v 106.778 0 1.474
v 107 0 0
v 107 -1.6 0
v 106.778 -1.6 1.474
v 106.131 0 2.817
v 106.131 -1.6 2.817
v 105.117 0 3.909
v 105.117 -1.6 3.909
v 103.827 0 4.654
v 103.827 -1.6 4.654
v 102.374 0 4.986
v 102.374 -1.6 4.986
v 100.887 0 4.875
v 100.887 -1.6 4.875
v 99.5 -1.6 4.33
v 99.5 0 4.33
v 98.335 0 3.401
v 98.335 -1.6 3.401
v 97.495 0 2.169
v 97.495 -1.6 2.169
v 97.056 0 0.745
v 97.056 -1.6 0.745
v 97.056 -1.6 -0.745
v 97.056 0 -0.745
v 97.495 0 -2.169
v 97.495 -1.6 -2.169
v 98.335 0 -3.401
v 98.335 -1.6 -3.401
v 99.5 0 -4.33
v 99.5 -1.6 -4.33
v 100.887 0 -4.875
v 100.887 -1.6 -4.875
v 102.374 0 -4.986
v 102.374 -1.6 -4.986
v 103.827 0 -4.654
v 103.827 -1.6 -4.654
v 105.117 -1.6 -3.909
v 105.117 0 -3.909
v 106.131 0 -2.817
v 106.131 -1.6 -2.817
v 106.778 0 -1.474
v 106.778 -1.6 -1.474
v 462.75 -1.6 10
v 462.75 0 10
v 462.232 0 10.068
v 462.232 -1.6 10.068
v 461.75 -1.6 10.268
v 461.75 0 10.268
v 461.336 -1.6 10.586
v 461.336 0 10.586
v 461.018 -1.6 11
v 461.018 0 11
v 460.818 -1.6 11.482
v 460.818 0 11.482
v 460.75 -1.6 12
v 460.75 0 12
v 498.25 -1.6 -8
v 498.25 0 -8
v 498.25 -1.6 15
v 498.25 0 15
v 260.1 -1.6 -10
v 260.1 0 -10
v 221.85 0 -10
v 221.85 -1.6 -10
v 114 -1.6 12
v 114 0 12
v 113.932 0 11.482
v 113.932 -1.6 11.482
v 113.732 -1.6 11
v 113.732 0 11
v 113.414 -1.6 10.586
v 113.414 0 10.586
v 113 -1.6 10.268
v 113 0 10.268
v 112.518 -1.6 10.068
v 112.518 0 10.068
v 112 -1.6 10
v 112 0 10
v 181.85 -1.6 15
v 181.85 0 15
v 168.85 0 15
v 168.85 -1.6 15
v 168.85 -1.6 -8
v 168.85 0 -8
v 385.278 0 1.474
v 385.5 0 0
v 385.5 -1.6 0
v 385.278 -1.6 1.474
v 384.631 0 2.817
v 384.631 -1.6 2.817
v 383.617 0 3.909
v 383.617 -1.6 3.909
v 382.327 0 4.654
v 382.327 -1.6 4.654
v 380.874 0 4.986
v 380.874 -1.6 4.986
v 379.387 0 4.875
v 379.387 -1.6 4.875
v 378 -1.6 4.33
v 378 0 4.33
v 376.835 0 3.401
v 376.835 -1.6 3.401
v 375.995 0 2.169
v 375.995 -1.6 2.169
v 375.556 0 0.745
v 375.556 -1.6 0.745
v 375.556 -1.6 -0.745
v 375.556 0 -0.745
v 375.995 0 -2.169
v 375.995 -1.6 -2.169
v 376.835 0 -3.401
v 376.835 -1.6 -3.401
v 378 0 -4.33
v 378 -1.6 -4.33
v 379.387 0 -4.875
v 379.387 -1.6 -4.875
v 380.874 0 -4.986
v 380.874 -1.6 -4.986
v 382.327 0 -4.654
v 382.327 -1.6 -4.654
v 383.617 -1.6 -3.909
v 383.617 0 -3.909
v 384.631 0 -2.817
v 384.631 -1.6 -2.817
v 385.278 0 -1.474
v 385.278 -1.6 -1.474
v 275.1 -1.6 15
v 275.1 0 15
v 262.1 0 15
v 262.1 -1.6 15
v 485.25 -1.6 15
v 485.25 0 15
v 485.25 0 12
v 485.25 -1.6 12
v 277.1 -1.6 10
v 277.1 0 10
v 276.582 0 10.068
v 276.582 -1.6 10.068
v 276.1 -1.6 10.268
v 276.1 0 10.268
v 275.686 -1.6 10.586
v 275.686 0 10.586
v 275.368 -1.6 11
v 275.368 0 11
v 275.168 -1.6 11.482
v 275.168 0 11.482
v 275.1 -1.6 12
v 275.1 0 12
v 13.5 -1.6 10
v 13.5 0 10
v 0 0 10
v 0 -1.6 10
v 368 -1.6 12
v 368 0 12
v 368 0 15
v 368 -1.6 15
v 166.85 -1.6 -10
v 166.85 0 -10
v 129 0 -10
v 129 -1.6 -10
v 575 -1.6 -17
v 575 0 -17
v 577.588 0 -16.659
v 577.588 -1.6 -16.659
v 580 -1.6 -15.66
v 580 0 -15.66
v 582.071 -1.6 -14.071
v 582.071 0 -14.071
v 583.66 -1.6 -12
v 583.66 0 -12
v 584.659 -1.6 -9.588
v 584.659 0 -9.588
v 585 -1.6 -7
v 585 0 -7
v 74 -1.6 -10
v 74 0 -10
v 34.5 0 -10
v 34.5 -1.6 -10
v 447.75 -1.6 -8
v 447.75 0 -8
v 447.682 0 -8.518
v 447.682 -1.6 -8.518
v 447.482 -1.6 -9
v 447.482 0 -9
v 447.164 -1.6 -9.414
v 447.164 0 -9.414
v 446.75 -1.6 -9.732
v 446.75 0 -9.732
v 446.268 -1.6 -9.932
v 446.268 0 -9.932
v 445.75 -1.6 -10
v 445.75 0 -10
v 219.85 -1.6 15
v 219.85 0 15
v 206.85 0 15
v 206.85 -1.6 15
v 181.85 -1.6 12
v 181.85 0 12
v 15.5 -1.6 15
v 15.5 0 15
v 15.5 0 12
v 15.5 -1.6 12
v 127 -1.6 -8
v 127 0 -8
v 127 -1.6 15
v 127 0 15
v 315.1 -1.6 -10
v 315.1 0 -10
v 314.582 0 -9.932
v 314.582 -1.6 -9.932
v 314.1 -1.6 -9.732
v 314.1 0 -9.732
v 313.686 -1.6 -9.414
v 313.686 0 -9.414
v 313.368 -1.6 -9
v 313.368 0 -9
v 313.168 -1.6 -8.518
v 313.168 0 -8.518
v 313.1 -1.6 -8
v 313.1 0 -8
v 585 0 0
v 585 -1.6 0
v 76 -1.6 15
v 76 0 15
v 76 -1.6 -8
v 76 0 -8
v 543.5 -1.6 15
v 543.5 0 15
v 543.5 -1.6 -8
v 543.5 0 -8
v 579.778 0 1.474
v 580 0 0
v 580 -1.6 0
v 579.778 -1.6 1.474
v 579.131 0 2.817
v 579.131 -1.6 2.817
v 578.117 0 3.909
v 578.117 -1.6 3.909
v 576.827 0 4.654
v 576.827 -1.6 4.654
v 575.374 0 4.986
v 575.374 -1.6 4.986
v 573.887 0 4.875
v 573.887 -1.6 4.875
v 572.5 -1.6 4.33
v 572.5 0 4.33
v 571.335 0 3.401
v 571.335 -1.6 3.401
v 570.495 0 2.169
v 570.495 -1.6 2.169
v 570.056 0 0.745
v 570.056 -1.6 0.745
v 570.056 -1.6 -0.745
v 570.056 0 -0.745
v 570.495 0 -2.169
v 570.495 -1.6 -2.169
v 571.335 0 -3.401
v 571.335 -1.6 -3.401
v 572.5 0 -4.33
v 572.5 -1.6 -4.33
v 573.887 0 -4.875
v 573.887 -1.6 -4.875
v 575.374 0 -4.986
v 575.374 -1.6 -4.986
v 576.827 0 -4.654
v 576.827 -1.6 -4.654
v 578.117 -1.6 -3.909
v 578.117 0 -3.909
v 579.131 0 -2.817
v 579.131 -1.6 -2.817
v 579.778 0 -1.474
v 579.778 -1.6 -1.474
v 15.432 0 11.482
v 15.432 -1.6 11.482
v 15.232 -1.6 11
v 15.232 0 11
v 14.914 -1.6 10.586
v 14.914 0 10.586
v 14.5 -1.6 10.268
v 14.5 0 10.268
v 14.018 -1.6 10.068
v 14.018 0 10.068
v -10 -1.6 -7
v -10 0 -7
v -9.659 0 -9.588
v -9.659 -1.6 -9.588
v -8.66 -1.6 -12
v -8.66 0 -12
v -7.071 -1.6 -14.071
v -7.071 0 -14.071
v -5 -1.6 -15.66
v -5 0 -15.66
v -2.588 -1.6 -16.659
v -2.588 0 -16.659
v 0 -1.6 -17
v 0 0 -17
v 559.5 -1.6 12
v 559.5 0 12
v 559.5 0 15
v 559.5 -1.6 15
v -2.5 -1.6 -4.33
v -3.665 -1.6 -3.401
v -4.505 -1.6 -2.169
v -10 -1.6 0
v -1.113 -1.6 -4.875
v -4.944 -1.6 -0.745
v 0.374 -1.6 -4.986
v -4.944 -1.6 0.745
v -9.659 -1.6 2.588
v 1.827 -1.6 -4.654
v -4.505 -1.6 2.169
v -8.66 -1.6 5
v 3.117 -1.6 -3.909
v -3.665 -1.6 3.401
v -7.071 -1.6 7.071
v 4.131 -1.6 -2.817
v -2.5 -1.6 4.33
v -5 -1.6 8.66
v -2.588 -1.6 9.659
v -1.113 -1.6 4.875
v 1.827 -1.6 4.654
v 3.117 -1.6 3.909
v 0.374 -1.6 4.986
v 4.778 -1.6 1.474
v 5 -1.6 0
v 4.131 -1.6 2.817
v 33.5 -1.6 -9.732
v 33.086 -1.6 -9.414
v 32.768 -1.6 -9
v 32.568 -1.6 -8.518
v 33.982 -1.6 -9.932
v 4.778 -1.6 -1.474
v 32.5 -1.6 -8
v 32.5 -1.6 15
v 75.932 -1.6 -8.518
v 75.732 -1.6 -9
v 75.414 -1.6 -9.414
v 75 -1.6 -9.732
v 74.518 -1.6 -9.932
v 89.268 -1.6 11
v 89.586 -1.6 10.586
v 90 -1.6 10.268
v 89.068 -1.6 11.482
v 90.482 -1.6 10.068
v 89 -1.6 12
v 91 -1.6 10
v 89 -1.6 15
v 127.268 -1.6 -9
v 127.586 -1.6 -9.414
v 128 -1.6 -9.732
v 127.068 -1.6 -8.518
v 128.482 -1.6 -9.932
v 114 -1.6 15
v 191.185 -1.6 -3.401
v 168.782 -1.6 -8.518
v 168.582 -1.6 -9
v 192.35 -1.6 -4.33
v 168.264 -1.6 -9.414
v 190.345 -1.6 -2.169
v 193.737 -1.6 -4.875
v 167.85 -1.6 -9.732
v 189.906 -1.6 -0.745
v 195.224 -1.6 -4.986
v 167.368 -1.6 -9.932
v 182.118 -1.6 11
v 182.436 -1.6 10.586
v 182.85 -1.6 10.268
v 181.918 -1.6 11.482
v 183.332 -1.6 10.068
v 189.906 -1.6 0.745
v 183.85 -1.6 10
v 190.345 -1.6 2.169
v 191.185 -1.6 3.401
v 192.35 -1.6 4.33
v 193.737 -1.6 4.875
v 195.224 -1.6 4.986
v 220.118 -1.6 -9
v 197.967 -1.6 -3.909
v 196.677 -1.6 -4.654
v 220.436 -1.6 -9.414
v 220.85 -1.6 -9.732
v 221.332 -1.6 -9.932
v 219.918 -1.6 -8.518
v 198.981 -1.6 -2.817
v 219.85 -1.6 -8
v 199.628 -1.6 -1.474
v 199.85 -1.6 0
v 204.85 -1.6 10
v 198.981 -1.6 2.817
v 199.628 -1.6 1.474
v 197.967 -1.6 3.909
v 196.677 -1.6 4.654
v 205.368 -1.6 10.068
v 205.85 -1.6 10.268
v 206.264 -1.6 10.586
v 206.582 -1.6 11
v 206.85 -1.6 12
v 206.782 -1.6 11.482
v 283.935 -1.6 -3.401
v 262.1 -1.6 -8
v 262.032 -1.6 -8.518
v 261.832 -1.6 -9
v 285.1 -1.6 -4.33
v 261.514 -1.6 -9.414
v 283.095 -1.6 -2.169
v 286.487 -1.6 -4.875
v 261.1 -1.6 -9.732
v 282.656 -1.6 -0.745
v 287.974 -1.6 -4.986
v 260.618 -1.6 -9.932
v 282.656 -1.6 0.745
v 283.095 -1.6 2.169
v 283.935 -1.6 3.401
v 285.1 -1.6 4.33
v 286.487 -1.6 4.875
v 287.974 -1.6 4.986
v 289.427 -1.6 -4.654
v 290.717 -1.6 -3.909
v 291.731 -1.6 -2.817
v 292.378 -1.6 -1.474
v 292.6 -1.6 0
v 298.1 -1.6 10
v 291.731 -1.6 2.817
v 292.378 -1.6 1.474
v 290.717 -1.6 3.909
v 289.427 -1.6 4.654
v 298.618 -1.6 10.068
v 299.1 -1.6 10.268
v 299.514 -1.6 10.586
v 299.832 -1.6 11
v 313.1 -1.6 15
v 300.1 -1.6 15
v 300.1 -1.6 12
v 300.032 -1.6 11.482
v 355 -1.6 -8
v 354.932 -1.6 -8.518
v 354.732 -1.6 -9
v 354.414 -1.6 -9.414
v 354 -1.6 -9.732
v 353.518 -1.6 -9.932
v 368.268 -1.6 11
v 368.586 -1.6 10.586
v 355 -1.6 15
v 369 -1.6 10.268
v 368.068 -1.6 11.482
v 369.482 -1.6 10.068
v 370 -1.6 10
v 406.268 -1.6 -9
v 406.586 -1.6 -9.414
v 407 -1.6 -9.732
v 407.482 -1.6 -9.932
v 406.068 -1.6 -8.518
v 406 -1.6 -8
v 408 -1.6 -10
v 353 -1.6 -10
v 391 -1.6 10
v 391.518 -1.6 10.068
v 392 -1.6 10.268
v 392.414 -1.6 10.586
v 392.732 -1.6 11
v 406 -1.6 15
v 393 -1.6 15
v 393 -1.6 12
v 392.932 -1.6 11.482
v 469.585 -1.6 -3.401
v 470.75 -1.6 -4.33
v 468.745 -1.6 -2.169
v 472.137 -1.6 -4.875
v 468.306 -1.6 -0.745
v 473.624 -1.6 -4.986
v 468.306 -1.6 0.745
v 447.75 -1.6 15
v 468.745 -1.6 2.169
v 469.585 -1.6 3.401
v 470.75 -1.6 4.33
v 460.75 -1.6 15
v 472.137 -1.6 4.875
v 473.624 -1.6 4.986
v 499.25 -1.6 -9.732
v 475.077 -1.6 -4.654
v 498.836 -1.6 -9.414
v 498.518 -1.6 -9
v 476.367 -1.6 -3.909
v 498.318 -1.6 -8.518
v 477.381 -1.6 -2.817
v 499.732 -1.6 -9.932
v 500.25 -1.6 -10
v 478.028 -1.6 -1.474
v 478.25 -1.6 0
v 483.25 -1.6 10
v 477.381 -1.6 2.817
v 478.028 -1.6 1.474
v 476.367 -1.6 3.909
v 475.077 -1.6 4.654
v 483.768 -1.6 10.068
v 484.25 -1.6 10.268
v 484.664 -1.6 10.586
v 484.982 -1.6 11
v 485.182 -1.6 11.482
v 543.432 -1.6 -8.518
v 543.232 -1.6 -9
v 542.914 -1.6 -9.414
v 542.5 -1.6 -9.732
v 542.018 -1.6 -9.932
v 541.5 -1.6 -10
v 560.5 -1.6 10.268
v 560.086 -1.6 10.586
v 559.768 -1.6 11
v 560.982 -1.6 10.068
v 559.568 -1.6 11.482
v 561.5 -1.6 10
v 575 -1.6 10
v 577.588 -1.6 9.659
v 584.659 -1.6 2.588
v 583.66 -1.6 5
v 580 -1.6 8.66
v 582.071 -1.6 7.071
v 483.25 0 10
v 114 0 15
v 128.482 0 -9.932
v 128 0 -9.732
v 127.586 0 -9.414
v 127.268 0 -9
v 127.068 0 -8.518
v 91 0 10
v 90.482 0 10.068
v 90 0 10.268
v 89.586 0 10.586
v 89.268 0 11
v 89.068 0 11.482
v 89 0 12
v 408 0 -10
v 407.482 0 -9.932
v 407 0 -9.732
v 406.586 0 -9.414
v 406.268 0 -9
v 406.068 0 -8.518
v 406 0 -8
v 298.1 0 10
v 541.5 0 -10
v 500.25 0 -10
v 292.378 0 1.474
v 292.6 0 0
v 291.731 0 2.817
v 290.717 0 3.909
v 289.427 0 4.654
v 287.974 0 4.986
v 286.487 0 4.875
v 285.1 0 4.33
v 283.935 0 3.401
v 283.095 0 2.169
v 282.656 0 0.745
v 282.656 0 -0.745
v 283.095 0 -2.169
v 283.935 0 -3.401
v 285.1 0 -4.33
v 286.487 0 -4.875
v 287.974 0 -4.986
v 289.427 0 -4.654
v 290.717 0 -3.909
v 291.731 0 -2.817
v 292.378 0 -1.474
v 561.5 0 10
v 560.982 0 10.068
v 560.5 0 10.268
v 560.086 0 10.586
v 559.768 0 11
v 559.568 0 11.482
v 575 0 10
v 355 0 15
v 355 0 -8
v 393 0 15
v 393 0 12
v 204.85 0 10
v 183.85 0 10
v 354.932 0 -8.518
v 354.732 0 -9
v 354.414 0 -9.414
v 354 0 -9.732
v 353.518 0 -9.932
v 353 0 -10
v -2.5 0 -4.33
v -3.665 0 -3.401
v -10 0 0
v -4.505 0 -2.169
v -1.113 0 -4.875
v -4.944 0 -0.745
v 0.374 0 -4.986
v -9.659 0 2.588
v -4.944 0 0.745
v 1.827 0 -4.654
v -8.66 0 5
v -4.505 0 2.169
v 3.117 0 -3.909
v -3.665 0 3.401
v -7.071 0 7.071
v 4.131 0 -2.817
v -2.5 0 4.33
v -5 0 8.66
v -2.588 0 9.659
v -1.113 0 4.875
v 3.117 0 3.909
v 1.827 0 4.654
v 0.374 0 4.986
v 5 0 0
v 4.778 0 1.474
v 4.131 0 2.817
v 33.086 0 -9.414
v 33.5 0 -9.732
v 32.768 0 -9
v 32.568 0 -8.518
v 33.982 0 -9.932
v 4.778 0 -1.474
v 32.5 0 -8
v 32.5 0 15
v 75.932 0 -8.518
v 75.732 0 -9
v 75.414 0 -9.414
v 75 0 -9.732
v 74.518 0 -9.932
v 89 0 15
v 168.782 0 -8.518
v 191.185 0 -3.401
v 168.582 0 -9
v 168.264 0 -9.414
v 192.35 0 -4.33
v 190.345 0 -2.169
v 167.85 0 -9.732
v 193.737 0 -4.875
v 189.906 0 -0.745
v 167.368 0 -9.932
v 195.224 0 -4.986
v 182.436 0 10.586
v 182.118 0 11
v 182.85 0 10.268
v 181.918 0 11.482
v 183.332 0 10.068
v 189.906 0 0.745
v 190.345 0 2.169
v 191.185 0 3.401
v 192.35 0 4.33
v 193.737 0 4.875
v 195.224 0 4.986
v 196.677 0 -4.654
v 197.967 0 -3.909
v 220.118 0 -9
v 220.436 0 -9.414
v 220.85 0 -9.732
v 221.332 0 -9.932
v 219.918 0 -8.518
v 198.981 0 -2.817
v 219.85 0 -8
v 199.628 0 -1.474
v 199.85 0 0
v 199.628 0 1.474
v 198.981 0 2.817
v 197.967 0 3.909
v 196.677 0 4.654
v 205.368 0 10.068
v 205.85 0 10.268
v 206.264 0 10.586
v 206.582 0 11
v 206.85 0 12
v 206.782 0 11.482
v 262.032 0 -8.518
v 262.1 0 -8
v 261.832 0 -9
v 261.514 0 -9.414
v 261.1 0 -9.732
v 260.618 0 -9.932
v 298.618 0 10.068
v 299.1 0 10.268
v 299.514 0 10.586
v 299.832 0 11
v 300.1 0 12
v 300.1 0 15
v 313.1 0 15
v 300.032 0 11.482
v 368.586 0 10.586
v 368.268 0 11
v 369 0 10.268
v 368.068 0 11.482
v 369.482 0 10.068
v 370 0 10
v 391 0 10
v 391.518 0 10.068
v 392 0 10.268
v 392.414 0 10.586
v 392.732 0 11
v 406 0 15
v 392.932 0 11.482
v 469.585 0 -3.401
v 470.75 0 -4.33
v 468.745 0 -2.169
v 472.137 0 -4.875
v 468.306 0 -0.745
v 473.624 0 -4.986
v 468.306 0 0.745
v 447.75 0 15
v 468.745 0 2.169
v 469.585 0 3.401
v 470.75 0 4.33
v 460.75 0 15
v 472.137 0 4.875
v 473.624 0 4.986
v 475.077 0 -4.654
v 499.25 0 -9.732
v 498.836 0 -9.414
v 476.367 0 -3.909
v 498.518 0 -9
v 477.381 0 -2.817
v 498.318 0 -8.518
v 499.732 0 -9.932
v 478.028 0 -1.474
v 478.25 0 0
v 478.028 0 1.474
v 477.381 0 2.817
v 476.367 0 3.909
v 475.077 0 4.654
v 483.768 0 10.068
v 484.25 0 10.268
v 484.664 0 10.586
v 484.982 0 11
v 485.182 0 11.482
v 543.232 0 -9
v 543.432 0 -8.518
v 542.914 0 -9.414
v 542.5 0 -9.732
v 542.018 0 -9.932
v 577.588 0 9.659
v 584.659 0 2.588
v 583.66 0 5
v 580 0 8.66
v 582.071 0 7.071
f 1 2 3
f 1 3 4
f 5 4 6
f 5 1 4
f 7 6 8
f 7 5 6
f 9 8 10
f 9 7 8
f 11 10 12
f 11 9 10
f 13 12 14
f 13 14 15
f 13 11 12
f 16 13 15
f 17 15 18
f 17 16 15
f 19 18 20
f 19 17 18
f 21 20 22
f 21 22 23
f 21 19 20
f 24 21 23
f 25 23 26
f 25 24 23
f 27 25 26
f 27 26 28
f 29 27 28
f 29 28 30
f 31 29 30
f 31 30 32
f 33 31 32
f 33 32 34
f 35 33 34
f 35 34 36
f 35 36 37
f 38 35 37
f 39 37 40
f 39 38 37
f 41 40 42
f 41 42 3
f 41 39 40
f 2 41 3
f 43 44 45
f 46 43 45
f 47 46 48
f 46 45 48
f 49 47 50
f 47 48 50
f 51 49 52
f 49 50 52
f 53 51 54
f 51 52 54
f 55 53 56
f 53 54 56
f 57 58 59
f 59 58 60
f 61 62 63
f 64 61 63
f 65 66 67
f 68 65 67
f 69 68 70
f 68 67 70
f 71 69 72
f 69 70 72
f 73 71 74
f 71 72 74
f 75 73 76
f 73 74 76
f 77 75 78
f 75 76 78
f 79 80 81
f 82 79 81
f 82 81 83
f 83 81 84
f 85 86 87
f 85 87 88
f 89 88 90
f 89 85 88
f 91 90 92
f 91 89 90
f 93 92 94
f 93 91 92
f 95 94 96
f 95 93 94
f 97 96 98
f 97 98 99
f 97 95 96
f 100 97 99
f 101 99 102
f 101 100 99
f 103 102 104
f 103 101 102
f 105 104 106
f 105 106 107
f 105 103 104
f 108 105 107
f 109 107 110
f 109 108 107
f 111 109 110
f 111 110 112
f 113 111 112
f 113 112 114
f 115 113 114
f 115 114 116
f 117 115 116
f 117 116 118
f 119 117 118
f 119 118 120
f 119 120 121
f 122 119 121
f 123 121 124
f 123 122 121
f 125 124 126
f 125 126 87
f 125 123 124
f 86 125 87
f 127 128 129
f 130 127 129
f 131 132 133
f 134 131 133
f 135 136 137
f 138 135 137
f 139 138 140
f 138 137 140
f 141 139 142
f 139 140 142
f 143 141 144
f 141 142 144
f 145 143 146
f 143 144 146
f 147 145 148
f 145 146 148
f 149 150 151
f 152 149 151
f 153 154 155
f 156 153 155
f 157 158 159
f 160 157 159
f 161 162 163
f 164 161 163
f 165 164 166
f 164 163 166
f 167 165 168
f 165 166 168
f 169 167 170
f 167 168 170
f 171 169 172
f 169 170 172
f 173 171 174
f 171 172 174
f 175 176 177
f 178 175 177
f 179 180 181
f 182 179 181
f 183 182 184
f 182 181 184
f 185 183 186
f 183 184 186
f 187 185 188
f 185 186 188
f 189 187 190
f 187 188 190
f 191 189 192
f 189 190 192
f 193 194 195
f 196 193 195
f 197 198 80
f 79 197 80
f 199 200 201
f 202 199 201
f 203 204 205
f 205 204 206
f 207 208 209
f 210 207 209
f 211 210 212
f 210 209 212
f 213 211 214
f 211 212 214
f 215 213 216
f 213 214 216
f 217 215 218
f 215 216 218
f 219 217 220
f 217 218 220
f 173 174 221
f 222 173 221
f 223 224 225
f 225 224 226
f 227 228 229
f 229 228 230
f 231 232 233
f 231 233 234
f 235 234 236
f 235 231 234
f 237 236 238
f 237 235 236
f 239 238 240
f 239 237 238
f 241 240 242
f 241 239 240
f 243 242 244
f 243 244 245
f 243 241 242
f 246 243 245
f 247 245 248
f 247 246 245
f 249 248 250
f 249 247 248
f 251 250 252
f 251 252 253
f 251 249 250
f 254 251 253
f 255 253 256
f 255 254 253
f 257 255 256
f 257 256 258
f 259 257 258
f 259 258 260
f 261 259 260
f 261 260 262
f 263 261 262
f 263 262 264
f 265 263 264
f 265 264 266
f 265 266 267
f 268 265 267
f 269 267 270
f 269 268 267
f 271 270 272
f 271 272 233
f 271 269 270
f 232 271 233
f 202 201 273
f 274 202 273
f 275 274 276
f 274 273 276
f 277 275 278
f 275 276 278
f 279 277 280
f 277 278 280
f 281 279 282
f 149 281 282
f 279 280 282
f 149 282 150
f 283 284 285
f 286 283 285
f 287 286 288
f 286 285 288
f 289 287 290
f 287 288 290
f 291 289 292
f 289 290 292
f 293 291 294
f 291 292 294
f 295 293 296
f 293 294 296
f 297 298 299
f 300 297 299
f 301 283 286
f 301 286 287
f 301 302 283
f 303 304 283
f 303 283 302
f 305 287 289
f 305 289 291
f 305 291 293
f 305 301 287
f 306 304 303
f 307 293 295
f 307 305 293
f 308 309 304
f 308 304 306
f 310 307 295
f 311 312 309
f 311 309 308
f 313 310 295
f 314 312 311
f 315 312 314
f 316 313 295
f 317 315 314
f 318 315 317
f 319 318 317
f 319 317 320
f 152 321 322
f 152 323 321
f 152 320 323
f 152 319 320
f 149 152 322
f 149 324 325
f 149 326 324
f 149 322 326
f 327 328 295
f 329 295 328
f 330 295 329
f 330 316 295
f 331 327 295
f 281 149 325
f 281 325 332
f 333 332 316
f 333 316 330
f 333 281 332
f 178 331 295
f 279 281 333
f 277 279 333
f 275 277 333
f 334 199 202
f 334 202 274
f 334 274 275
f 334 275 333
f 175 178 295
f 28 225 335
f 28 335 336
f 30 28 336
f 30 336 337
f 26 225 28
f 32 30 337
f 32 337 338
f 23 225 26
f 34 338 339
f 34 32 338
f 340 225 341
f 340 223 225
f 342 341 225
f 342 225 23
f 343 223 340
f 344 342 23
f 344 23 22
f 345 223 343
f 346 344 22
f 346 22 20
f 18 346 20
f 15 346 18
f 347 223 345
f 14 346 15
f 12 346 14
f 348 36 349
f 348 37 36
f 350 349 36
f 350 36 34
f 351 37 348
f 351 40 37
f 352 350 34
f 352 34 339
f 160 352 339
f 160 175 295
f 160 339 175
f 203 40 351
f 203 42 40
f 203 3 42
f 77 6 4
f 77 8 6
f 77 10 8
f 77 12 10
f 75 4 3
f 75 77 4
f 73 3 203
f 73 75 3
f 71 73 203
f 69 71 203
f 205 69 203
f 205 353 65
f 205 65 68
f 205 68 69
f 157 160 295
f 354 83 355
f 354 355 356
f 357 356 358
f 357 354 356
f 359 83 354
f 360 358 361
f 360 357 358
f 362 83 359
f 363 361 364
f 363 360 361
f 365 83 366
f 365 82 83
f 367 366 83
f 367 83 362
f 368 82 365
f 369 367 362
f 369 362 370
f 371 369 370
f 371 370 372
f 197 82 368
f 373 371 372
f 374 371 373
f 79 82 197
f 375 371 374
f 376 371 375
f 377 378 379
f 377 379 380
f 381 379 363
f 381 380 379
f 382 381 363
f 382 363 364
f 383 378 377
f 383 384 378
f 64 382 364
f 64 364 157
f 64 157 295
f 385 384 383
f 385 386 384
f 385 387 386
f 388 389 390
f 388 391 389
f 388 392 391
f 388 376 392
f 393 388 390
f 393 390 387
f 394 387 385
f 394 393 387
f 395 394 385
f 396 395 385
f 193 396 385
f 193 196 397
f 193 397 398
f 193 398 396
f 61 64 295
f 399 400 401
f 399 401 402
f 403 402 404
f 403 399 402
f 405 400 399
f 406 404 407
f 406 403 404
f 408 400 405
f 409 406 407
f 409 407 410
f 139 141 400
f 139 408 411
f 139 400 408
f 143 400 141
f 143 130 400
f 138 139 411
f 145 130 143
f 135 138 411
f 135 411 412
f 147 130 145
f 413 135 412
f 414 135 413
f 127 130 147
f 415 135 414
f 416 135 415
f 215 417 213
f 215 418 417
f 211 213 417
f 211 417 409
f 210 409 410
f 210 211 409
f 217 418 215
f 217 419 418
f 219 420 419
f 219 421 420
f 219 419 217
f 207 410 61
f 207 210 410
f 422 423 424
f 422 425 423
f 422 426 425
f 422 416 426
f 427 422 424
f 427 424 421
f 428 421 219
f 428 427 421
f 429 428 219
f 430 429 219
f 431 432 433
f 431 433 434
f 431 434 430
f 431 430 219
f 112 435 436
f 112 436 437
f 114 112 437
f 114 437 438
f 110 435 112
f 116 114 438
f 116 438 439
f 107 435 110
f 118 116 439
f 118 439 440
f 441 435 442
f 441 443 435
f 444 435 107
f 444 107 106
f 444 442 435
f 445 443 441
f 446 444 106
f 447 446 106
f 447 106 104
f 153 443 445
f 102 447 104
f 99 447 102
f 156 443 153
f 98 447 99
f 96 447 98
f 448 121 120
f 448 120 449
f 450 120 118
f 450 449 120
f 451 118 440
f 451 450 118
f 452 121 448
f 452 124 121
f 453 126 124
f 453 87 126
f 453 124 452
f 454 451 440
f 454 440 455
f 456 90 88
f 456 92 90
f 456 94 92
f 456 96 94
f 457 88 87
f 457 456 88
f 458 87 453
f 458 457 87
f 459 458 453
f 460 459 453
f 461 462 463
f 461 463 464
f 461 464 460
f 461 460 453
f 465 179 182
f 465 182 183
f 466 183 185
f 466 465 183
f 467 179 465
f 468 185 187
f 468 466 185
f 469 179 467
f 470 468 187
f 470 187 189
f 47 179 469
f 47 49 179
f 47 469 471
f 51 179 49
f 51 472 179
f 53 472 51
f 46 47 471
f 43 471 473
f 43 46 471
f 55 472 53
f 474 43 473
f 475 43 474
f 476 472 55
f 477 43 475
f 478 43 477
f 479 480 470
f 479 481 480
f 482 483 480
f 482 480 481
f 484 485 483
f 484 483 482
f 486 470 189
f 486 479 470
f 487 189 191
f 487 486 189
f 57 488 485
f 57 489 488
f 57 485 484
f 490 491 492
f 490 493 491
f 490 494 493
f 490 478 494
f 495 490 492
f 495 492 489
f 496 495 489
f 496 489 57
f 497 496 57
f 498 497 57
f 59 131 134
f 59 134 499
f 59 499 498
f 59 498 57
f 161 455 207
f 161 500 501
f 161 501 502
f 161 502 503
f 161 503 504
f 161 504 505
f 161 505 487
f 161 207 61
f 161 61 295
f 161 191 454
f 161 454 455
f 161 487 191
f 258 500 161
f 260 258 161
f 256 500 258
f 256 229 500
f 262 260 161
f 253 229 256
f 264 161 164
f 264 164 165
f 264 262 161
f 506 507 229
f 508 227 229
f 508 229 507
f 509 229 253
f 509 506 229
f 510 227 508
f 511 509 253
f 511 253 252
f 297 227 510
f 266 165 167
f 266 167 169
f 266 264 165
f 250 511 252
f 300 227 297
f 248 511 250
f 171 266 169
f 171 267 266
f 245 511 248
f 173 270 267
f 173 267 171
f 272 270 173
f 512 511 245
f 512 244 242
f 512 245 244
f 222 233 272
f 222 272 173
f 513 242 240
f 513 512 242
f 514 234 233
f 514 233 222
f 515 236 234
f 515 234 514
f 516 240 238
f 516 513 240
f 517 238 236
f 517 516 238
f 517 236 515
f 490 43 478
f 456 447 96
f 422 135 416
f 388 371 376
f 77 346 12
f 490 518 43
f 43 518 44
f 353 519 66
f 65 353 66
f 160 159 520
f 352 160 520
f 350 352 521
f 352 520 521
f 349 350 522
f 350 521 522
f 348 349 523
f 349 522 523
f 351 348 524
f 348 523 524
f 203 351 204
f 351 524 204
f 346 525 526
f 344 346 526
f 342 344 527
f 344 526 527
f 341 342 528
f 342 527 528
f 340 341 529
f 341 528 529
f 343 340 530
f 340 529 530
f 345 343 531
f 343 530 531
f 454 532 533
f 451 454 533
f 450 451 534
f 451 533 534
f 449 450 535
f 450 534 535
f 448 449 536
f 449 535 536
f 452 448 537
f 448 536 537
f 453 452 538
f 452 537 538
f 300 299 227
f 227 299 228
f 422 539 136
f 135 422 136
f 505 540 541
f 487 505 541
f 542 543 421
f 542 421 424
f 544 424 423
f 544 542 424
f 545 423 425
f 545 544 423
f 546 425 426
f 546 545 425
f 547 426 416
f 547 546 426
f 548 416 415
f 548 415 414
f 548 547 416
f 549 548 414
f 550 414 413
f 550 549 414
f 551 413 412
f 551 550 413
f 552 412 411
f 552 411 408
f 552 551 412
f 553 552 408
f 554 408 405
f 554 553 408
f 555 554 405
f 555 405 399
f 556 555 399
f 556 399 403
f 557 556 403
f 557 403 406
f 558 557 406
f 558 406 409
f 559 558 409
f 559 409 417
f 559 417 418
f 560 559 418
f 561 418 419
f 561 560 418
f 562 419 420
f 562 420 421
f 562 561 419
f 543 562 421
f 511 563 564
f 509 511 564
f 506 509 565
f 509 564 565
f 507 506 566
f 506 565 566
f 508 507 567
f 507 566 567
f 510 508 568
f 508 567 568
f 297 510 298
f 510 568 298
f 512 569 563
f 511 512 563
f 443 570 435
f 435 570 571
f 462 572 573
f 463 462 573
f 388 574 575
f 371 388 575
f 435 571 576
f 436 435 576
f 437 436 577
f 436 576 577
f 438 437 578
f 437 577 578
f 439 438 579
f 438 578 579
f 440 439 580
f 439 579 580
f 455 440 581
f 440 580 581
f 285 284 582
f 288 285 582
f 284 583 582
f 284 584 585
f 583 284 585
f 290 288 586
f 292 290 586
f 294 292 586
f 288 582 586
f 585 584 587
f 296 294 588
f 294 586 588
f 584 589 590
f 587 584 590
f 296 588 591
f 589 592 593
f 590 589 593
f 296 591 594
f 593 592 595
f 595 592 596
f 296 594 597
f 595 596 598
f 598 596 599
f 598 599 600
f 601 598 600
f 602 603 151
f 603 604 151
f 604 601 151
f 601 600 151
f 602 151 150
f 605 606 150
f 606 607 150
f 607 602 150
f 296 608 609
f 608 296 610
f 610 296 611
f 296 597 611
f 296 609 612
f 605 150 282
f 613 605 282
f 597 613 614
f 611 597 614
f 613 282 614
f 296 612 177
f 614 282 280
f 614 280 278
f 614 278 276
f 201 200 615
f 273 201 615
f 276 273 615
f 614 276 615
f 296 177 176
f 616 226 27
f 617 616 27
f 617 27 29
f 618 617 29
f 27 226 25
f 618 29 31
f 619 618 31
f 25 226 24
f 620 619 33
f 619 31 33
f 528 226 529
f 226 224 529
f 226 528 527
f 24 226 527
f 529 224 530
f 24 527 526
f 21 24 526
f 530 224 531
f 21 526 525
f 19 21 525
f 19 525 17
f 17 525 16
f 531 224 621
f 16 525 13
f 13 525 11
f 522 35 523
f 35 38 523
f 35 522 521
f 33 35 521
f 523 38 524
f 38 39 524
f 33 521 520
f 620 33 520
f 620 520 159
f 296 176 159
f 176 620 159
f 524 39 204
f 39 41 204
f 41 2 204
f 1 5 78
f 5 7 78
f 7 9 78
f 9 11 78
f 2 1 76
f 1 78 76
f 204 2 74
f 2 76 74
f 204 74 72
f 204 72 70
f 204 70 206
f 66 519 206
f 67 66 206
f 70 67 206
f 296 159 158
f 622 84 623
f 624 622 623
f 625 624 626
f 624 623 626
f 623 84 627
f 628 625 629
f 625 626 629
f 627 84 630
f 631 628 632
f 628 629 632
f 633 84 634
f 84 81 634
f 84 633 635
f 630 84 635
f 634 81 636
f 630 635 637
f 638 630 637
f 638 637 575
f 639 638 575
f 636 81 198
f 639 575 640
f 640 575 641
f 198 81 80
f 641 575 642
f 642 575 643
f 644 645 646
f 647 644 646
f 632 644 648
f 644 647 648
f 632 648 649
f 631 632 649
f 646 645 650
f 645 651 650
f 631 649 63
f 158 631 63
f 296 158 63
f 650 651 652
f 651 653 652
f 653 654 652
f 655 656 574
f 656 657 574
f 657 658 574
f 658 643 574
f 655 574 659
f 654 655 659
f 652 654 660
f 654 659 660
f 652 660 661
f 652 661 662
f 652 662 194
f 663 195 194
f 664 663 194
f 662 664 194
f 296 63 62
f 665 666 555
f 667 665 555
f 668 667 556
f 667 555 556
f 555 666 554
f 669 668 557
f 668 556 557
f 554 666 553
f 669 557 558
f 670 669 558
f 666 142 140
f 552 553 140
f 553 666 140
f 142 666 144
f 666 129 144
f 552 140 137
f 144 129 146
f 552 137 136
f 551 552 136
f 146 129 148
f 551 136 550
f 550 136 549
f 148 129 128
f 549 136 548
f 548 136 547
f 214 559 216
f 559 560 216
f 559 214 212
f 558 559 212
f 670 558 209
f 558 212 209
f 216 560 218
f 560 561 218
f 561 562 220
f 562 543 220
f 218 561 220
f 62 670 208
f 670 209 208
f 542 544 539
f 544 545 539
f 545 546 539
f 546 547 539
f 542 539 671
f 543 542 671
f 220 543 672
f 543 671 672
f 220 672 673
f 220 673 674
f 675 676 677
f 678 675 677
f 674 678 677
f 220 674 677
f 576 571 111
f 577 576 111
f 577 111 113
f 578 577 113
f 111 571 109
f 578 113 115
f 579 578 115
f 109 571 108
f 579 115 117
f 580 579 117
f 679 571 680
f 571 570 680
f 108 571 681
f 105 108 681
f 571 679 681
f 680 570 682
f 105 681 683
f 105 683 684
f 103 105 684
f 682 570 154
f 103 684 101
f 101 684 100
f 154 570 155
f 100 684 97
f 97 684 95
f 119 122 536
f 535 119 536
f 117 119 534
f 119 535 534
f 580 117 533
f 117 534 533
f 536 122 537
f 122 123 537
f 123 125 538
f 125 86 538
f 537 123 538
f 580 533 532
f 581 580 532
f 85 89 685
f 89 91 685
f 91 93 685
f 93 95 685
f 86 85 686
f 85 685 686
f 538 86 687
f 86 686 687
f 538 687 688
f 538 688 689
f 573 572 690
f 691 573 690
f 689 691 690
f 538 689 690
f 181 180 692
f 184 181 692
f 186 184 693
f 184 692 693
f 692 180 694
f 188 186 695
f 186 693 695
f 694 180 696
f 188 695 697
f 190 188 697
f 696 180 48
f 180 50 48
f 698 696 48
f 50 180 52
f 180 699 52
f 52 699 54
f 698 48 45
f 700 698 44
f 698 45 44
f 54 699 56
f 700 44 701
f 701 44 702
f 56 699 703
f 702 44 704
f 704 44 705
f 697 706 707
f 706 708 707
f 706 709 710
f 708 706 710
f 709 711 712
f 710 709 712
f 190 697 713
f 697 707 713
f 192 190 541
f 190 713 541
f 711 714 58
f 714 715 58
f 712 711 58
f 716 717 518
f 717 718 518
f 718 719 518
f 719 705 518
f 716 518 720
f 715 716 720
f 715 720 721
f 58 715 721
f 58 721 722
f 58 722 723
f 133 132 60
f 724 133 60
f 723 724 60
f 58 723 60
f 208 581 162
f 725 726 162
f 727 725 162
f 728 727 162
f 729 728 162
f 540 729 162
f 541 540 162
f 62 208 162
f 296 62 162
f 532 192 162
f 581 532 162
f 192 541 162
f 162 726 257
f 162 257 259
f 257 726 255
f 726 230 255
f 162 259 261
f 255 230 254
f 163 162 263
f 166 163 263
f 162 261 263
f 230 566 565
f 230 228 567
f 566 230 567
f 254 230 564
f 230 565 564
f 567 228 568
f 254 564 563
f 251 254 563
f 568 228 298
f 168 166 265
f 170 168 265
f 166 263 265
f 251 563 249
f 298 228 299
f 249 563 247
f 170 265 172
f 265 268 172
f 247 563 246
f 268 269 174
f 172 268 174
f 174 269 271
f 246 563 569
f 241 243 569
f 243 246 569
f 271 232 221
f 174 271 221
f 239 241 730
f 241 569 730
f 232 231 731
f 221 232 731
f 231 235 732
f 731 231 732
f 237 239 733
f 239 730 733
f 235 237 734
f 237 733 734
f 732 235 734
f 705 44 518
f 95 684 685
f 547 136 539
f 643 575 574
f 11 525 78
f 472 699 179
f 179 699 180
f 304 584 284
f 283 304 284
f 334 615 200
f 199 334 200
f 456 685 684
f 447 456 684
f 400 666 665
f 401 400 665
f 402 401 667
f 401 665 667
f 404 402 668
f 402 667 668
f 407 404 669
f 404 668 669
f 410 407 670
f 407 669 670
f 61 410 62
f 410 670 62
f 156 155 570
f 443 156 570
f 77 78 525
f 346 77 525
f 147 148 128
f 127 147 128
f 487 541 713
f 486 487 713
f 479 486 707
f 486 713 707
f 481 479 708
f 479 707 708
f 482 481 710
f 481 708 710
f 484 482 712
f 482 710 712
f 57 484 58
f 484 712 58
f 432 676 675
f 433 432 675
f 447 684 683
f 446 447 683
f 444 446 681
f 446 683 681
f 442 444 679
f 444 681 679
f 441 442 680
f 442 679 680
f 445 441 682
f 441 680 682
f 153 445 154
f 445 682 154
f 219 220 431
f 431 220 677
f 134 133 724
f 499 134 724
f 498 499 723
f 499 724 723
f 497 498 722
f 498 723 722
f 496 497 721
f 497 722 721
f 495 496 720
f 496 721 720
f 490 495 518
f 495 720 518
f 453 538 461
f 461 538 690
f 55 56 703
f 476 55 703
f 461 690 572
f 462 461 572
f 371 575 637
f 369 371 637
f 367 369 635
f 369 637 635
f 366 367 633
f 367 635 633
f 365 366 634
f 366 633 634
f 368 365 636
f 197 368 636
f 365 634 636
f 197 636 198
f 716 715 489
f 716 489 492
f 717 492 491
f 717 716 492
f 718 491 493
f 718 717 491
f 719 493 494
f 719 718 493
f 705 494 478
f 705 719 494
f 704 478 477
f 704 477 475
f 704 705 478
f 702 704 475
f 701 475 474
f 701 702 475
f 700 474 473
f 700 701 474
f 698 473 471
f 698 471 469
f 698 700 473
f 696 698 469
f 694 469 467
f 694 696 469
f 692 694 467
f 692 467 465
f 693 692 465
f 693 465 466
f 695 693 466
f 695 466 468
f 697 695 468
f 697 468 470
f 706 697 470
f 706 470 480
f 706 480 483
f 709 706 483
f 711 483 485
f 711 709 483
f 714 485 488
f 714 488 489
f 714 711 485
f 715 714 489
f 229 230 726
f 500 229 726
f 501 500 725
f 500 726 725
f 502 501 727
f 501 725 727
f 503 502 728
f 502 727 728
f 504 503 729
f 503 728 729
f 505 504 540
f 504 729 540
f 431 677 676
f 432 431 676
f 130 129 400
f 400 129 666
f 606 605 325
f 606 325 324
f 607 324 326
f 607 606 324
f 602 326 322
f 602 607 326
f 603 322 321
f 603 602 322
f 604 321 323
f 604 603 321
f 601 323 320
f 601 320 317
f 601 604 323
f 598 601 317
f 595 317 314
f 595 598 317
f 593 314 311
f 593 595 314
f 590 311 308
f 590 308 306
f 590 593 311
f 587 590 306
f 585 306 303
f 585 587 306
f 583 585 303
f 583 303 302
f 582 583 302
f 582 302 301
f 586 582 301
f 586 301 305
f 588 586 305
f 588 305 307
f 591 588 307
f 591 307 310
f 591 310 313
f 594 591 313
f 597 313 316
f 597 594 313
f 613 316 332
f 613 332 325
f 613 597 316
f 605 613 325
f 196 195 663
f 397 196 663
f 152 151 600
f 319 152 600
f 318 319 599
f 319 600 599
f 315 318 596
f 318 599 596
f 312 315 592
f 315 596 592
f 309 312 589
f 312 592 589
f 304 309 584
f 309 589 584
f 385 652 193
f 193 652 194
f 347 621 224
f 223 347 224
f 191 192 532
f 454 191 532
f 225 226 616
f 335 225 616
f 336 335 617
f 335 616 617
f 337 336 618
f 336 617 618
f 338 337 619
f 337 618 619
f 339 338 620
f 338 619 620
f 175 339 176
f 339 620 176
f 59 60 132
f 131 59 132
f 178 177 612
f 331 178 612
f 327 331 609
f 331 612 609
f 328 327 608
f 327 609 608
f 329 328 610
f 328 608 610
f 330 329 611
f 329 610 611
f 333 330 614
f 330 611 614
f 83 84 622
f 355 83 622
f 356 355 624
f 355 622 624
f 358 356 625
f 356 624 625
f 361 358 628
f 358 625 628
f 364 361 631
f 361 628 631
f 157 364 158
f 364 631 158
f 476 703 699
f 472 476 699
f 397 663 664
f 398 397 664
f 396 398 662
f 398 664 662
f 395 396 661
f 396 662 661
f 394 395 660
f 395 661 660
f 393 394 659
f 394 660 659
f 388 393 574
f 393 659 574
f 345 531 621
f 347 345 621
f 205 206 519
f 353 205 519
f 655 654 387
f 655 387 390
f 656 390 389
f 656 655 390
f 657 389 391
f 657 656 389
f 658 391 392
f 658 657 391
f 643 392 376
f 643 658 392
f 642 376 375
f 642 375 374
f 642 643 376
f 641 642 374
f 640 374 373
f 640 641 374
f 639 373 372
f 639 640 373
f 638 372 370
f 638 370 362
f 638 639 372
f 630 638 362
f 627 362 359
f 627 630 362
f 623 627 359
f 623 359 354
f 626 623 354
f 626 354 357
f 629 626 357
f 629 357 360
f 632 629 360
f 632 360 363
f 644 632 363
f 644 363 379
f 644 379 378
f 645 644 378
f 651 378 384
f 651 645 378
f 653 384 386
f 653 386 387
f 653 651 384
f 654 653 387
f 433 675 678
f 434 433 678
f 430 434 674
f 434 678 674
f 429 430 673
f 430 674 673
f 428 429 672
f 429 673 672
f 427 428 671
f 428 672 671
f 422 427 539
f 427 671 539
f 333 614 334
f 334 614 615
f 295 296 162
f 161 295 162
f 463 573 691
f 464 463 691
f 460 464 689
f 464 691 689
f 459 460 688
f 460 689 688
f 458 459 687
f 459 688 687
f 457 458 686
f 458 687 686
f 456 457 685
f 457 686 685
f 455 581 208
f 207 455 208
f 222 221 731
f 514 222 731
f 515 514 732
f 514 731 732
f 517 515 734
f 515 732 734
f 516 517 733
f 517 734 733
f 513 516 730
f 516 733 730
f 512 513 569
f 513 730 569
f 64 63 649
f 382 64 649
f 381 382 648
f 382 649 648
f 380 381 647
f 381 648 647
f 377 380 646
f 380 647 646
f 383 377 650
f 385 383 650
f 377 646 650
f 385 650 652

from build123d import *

# Parameters (mm, degrees)
F0_R     = 5
F1_DEPTH = 1.6


with BuildPart() as f1:
    # F0 (on Front) → F1 (new body)
    with BuildSketch(Plane.XZ):
        with BuildLine():
            ThreePointArc((-10, -7), (-7.071068, -14.071068), (0, -17))
            Line((0, -17), (575, -17))
            ThreePointArc((575, -17), (582.071068, -14.071068), (585, -7))
            Line((585, -7), (585, 0))
            ThreePointArc((585, 0), (582.071068, 7.071068), (575, 10))
            Line((575, 10), (561.5, 10))
            ThreePointArc((561.5, 10), (560.085786, 10.585786), (559.5, 12))
            Line((559.5, 12), (559.5, 15))
            Line((559.5, 15), (543.5, 15))
            Line((543.5, 15), (543.5, -8))
            ThreePointArc((543.5, -8), (542.914214, -9.414214), (541.5, -10))
            Line((541.5, -10), (500.25, -10))
            ThreePointArc((500.25, -10), (498.835786, -9.414214), (498.25, -8))
            Line((498.25, -8), (498.25, 15))
            Line((498.25, 15), (485.25, 15))
            Line((485.25, 15), (485.25, 12))
            ThreePointArc((485.25, 12), (484.664214, 10.585786), (483.25, 10))
            Line((483.25, 10), (462.75, 10))
            ThreePointArc((462.75, 10), (461.335786, 10.585786), (460.75, 12))
            Line((460.75, 12), (460.75, 15))
            Line((460.75, 15), (447.75, 15))
            Line((447.75, 15), (447.75, -8))
            ThreePointArc((447.75, -8), (447.164214, -9.414214), (445.75, -10))
            Line((445.75, -10), (408, -10))
            ThreePointArc((408, -10), (406.585786, -9.414214), (406, -8))
            Line((406, -8), (406, 15))
            Line((406, 15), (393, 15))
            Line((393, 15), (393, 12))
            ThreePointArc((393, 12), (392.414214, 10.585786), (391, 10))
            Line((391, 10), (370, 10))
            ThreePointArc((370, 10), (368.585786, 10.585786), (368, 12))
            Line((368, 12), (368, 15))
            Line((368, 15), (355, 15))
            Line((355, 15), (355, -8))
            ThreePointArc((355, -8), (354.414214, -9.414214), (353, -10))
            Line((353, -10), (315.1, -10))
            ThreePointArc((315.1, -10), (313.685786, -9.414214), (313.1, -8))
            Line((313.1, -8), (313.1, 15))
            Line((313.1, 15), (300.1, 15))
            Line((300.1, 15), (300.1, 12))
            ThreePointArc((300.1, 12), (299.514214, 10.585786), (298.1, 10))
            Line((298.1, 10), (277.1, 10))
            ThreePointArc((277.1, 10), (275.685786, 10.585786), (275.1, 12))
            Line((275.1, 12), (275.1, 15))
            Line((275.1, 15), (262.1, 15))
            Line((262.1, 15), (262.1, -8))
            ThreePointArc((262.1, -8), (261.514214, -9.414214), (260.1, -10))
            Line((260.1, -10), (221.85, -10))
            ThreePointArc((221.85, -10), (220.435786, -9.414214), (219.85, -8))
            Line((219.85, -8), (219.85, 15))
            Line((219.85, 15), (206.85, 15))
            Line((206.85, 15), (206.85, 12))
            ThreePointArc((206.85, 12), (206.264214, 10.585786), (204.85, 10))
            Line((204.85, 10), (183.85, 10))
            ThreePointArc((183.85, 10), (182.435786, 10.585786), (181.85, 12))
            Line((181.85, 12), (181.85, 15))
            Line((181.85, 15), (168.85, 15))
            Line((168.85, 15), (168.85, -8))
            ThreePointArc((168.85, -8), (168.264214, -9.414214), (166.85, -10))
            Line((166.85, -10), (129, -10))
            ThreePointArc((129, -10), (127.585786, -9.414214), (127, -8))
            Line((127, -8), (127, 15))
            Line((127, 15), (114, 15))
            Line((114, 15), (114, 12))
            ThreePointArc((114, 12), (113.414214, 10.585786), (112, 10))
            Line((112, 10), (91, 10))
            ThreePointArc((91, 10), (89.585786, 10.585786), (89, 12))
            Line((89, 12), (89, 15))
            Line((89, 15), (76, 15))
            Line((76, 15), (76, -8))
            ThreePointArc((76, -8), (75.414214, -9.414214), (74, -10))
            Line((74, -10), (34.5, -10))
            ThreePointArc((34.5, -10), (33.085786, -9.414214), (32.5, -8))
            Line((32.5, -8), (32.5, 15))
            Line((32.5, 15), (15.5, 15))
            Line((15.5, 15), (15.5, 12))
            ThreePointArc((15.5, 12), (14.914214, 10.585786), (13.5, 10))
            Line((13.5, 10), (0, 10))
            ThreePointArc((0, 10), (-7.071068, 7.071068), (-10, 0))
            Line((-10, 0), (-10, -7))
        make_face()
        Circle(F0_R, mode=Mode.SUBTRACT)
        with Locations((102, 0)):
            Circle(F0_R, mode=Mode.SUBTRACT)
        with Locations((194.85, 0)):
            Circle(F0_R, mode=Mode.SUBTRACT)
        with Locations((287.6, 0)):
            Circle(F0_R, mode=Mode.SUBTRACT)
        with Locations((380.5, 0)):
            Circle(F0_R, mode=Mode.SUBTRACT)
        with Locations((473.25, 0)):
            Circle(F0_R, mode=Mode.SUBTRACT)
        with Locations((575, 0)):
            Circle(F0_R, mode=Mode.SUBTRACT)
    extrude(amount=F1_DEPTH)


solid = f1.part
